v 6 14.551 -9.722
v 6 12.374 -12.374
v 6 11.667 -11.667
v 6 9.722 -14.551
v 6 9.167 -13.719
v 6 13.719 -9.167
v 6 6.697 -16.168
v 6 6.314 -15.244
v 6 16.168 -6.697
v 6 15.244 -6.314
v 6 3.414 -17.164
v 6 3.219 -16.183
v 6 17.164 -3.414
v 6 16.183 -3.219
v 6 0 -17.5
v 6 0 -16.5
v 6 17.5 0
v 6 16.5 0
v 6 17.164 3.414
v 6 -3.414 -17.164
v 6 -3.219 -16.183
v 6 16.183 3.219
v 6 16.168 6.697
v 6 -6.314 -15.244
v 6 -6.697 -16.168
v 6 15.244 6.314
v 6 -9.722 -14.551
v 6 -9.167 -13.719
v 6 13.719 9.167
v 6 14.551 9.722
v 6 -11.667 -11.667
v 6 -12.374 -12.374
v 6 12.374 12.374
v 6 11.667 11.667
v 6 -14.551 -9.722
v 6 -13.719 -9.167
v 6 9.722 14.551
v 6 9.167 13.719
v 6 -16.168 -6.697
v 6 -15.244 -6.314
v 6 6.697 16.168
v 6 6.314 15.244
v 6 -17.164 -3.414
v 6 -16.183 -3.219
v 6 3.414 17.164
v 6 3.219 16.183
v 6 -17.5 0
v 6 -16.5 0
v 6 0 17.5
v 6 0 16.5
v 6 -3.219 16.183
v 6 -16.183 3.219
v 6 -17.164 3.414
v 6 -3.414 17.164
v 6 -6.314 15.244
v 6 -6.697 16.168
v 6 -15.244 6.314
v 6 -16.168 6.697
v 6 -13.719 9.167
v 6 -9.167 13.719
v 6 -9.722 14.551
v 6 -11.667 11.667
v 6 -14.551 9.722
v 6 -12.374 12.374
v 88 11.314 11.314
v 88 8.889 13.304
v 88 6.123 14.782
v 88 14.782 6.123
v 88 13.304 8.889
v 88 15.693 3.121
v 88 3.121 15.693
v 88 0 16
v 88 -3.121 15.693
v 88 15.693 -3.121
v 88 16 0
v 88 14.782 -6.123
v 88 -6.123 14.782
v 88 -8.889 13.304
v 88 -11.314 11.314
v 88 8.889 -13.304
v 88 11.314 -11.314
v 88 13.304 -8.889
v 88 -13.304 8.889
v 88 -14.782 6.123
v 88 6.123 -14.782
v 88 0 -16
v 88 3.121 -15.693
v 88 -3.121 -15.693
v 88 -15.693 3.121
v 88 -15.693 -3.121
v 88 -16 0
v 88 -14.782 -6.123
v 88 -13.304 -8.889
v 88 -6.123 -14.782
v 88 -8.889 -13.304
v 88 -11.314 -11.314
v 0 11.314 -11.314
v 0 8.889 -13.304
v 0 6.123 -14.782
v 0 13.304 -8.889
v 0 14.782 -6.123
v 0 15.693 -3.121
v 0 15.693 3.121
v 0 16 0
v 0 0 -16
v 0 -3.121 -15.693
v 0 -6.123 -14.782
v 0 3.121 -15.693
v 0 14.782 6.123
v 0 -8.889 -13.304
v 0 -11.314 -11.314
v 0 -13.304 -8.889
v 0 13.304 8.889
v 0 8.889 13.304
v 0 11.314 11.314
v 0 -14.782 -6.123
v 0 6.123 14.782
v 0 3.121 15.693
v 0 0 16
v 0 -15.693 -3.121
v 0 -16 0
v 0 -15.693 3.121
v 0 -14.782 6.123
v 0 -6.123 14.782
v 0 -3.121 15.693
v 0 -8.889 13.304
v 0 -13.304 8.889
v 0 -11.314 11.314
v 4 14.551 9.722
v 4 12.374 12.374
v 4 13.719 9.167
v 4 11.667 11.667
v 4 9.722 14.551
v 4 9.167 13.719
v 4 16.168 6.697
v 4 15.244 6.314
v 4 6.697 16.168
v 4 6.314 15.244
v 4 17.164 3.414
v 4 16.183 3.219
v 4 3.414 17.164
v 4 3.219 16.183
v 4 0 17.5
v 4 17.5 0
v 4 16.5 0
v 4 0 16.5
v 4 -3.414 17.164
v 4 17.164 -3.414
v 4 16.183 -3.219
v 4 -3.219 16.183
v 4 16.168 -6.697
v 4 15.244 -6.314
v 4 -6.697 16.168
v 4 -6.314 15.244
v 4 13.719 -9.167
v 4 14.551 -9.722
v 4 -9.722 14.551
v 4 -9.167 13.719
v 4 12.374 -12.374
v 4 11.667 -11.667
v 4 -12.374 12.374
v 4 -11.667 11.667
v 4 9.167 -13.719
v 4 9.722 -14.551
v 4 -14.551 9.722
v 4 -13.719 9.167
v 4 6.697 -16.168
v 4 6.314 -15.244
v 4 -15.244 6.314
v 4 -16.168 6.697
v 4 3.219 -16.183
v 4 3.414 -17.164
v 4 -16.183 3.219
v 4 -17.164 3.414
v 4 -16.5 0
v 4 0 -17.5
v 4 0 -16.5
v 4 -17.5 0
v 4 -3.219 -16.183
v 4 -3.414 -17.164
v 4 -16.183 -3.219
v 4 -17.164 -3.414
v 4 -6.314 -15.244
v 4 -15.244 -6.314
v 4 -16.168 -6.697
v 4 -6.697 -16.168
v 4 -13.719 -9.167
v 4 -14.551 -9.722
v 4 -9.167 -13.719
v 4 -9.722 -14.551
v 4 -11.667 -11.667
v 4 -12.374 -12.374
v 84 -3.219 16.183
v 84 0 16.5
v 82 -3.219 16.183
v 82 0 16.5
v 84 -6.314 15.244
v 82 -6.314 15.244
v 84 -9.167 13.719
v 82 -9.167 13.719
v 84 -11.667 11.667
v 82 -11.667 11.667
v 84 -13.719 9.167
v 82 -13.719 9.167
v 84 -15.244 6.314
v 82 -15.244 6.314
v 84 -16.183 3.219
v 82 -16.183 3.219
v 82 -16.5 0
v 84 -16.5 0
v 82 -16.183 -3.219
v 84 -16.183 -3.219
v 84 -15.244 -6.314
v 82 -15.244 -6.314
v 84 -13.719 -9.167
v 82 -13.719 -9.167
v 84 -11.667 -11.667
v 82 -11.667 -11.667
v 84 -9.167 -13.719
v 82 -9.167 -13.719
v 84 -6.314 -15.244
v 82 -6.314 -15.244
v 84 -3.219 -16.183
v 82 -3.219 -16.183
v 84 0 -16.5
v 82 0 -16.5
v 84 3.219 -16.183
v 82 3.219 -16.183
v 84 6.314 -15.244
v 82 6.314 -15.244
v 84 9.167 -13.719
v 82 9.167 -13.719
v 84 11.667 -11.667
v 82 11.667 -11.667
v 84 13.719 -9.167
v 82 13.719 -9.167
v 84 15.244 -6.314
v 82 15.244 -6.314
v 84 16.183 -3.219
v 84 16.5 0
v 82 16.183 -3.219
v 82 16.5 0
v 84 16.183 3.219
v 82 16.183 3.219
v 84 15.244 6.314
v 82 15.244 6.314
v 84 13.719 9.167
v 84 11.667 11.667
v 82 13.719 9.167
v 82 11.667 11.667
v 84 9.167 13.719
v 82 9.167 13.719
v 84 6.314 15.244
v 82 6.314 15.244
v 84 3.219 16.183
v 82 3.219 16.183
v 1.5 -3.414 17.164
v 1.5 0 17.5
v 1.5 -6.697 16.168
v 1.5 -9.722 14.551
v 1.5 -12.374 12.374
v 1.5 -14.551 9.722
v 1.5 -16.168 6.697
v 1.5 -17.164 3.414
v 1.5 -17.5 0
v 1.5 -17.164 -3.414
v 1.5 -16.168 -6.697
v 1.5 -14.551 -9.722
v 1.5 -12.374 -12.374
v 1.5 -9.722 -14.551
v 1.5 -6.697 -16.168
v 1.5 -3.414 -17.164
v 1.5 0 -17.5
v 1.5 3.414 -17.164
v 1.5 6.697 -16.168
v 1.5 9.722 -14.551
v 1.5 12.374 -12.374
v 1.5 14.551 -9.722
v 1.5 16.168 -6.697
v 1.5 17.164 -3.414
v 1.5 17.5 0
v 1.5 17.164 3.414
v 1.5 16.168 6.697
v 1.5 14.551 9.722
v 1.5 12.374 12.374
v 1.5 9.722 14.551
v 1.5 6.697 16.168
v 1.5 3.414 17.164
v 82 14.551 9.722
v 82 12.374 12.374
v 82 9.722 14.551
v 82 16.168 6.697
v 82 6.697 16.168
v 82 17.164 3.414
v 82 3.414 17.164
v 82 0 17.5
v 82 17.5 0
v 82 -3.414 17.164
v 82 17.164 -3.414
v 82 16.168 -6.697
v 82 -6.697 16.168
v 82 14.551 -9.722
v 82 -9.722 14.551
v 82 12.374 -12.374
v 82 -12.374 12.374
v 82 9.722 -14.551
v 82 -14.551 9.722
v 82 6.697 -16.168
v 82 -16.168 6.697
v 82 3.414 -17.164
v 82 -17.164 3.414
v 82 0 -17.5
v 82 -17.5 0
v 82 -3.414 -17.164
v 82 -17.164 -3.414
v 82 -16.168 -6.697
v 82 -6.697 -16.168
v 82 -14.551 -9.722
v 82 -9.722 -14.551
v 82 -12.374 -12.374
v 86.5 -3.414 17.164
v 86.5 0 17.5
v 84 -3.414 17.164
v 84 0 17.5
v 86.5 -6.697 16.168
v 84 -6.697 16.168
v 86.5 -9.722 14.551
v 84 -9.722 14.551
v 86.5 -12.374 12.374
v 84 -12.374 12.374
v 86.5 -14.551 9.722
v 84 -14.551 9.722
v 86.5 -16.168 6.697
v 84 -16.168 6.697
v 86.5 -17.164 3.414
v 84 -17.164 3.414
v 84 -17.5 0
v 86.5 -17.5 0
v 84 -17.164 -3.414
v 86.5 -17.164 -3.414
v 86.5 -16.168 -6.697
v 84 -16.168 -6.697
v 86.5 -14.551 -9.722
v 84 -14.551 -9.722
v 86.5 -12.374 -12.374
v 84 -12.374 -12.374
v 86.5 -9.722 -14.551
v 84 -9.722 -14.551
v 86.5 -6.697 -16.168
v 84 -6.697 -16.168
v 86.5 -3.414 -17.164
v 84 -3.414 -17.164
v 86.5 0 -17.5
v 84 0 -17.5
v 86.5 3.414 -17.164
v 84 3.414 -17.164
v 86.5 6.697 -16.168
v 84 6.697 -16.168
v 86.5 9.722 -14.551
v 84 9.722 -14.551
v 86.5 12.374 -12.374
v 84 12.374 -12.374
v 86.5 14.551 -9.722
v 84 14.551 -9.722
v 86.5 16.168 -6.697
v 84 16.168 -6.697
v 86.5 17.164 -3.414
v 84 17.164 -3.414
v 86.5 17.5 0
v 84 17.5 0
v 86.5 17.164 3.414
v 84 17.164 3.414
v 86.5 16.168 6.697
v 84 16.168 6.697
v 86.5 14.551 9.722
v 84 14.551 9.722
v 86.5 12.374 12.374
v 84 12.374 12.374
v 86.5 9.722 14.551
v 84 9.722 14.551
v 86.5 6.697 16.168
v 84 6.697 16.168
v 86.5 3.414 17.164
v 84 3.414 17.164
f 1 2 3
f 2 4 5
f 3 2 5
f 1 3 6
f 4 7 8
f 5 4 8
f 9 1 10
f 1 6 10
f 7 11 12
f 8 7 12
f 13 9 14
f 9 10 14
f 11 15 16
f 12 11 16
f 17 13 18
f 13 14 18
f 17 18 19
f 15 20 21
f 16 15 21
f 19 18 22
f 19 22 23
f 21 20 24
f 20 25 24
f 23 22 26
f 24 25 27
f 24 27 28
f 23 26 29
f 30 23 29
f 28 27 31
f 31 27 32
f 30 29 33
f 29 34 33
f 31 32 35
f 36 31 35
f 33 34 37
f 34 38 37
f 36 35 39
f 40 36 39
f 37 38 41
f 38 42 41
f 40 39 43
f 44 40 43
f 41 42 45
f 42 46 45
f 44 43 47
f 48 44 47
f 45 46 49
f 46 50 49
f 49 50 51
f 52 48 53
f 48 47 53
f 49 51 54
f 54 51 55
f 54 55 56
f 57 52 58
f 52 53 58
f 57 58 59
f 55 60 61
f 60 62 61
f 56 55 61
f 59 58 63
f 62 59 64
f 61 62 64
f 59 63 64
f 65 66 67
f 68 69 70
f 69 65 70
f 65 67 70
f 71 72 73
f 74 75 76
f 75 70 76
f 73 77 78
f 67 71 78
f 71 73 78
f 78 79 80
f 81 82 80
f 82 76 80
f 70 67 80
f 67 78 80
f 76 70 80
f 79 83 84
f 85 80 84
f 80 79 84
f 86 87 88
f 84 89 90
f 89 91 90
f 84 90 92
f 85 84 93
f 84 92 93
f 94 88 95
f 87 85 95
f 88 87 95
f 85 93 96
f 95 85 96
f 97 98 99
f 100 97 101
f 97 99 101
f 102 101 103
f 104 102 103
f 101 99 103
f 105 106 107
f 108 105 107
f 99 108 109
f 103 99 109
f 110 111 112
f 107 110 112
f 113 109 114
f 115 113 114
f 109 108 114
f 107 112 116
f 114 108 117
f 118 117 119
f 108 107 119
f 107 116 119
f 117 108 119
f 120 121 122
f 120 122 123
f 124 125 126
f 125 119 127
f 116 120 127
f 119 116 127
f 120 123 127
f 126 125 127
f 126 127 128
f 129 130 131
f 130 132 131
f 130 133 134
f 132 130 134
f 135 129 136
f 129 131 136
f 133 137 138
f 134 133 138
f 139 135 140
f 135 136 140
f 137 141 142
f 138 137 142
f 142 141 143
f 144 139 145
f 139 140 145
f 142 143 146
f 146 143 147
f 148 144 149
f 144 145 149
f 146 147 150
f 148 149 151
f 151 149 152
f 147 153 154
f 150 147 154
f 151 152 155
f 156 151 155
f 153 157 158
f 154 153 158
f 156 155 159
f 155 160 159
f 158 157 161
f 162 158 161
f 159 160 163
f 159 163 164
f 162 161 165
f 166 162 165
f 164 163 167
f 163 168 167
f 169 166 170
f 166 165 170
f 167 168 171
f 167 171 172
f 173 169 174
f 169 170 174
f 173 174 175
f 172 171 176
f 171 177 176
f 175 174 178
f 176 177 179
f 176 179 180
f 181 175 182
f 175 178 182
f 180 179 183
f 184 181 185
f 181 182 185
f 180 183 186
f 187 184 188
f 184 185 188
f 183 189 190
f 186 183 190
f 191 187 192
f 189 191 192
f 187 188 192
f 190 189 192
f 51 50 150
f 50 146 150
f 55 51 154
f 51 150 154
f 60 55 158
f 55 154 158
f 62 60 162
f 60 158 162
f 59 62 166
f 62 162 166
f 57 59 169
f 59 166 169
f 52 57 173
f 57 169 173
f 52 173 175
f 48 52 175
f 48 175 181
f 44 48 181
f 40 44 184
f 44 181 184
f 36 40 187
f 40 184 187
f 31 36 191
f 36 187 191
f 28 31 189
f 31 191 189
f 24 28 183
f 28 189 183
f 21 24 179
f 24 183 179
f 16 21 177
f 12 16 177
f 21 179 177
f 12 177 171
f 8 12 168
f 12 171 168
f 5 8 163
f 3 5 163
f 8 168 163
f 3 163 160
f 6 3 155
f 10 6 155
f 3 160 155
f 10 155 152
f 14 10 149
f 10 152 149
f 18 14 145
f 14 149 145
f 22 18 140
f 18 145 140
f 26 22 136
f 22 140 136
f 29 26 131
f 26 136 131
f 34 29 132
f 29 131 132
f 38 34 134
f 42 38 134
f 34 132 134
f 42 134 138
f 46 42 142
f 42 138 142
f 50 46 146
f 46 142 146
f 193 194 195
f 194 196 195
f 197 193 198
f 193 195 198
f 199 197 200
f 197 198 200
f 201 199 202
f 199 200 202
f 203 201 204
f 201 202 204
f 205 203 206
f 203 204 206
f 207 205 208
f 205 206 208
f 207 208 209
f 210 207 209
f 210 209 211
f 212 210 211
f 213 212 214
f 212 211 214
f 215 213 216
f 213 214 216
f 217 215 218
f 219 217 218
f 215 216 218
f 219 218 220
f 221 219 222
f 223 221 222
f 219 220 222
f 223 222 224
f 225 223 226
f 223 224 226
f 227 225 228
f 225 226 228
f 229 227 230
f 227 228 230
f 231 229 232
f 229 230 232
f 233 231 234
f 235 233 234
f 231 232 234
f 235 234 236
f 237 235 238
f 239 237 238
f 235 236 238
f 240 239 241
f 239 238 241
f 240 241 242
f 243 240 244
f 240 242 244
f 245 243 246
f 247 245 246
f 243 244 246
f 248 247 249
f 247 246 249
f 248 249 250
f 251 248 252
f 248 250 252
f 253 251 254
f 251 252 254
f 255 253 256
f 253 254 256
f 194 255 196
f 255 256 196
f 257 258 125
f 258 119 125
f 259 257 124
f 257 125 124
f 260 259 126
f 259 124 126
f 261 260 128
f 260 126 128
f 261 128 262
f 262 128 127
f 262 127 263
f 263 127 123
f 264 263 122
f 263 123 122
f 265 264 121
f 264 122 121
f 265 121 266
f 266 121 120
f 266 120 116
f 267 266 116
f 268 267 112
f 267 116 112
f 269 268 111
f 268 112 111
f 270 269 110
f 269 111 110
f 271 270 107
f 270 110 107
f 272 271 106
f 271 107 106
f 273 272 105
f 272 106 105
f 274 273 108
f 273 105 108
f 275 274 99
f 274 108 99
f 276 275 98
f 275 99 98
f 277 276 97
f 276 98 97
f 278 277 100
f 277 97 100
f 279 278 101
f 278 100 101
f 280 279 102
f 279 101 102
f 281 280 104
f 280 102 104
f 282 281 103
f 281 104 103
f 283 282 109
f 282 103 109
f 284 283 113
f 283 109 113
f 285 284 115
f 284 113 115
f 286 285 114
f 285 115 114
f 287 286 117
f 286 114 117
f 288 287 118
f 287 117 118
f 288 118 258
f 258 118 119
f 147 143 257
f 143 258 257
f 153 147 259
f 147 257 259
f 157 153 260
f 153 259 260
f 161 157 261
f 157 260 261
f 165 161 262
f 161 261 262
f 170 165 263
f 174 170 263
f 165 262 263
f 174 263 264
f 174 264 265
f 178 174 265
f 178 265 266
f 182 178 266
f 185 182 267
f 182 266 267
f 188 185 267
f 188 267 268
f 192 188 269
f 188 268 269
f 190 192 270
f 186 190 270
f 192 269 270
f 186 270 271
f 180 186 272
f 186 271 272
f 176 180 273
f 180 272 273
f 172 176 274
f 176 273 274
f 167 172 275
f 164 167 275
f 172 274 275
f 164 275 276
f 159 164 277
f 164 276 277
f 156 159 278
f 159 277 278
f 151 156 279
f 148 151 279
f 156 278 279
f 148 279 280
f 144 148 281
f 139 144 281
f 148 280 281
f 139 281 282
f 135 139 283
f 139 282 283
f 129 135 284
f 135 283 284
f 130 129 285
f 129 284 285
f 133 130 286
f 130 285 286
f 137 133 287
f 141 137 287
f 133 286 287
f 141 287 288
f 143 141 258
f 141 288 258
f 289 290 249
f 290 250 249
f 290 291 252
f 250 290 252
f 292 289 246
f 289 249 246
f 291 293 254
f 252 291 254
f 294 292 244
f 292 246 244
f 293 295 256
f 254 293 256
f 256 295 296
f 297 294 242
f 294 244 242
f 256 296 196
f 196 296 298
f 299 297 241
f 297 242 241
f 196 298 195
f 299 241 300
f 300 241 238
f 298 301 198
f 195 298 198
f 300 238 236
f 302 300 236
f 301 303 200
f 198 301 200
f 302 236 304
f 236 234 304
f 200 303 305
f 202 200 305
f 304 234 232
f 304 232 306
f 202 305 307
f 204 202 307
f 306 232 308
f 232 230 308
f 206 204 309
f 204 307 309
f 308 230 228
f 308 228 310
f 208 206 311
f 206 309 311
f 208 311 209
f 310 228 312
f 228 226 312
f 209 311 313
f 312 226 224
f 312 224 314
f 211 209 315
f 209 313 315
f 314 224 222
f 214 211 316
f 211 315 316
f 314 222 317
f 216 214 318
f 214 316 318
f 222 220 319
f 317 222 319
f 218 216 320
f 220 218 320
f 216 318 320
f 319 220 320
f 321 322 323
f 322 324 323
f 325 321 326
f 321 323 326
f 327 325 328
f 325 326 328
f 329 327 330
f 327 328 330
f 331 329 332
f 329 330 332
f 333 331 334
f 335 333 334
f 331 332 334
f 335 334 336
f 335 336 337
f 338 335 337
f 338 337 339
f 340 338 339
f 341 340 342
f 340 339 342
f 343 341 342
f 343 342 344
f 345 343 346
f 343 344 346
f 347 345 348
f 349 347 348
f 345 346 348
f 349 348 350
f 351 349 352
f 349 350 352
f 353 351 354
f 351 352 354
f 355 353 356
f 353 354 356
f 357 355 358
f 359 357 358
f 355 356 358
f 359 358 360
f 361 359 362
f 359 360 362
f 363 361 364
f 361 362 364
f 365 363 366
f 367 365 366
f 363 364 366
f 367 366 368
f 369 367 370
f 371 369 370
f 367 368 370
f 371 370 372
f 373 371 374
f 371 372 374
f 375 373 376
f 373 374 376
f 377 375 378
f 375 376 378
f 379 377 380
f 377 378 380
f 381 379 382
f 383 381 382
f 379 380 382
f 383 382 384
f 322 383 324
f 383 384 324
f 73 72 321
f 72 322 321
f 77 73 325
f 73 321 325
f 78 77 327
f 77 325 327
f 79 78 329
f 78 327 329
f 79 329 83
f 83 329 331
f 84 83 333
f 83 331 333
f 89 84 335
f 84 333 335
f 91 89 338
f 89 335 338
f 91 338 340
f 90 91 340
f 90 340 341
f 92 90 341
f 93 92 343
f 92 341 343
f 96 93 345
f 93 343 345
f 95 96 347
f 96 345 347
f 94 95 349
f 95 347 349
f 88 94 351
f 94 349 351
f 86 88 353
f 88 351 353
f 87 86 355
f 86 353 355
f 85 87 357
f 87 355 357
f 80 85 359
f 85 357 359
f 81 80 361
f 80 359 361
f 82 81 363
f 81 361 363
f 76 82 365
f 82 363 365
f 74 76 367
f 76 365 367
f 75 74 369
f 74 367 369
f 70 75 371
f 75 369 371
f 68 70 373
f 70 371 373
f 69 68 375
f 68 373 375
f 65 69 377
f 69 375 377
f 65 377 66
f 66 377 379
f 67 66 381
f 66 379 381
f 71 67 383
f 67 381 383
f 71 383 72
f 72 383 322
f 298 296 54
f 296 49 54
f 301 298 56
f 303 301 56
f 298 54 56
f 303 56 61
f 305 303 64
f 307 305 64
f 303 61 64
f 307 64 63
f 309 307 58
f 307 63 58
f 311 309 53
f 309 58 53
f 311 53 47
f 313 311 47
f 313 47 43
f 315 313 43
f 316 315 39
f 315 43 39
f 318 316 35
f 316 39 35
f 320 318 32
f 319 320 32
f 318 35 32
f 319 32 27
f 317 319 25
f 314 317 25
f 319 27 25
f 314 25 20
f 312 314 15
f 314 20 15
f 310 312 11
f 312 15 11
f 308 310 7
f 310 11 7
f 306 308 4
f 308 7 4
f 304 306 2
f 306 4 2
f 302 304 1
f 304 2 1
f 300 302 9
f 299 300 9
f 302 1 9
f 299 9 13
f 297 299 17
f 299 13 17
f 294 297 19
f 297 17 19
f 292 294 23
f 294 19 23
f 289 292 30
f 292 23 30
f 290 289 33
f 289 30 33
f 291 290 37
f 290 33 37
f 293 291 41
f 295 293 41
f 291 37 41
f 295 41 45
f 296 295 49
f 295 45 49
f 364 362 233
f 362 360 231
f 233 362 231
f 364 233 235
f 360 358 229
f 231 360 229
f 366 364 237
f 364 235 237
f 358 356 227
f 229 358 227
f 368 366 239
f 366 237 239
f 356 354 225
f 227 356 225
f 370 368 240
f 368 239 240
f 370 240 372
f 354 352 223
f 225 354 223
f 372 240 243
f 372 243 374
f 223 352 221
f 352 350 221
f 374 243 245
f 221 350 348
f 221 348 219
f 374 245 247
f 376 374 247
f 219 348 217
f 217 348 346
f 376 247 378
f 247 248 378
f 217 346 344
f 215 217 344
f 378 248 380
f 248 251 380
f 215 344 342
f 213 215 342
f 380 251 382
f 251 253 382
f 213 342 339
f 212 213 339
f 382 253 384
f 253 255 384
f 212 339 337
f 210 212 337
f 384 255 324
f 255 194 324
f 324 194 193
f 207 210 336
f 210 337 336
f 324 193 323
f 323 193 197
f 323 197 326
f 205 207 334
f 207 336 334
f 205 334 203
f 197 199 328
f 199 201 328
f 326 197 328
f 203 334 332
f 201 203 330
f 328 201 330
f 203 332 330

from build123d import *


with BuildPart() as part:
    # Sketch1 → Revolve1 (revolve)
    with BuildSketch(Plane.XY, mode=Mode.PRIVATE) as revolve1_sk:
        Polygon((4, 16.5), (4, 17.5), (1.5, 17.5), (0, 16), (0, 0), (88, 0), (88, 16), (86.5, 17.5), (84, 17.5), (84, 16.5), (82, 16.5), (82, 17.5), (6, 17.5), (6, 16.5), align=None)
    revolve(revolve1_sk.sketch.rotate(Axis((-2, 0, 0), (1, 0, 0)), 90), axis=Axis((-2, 0, 0), (1, 0, 0)))


solid = part.part
